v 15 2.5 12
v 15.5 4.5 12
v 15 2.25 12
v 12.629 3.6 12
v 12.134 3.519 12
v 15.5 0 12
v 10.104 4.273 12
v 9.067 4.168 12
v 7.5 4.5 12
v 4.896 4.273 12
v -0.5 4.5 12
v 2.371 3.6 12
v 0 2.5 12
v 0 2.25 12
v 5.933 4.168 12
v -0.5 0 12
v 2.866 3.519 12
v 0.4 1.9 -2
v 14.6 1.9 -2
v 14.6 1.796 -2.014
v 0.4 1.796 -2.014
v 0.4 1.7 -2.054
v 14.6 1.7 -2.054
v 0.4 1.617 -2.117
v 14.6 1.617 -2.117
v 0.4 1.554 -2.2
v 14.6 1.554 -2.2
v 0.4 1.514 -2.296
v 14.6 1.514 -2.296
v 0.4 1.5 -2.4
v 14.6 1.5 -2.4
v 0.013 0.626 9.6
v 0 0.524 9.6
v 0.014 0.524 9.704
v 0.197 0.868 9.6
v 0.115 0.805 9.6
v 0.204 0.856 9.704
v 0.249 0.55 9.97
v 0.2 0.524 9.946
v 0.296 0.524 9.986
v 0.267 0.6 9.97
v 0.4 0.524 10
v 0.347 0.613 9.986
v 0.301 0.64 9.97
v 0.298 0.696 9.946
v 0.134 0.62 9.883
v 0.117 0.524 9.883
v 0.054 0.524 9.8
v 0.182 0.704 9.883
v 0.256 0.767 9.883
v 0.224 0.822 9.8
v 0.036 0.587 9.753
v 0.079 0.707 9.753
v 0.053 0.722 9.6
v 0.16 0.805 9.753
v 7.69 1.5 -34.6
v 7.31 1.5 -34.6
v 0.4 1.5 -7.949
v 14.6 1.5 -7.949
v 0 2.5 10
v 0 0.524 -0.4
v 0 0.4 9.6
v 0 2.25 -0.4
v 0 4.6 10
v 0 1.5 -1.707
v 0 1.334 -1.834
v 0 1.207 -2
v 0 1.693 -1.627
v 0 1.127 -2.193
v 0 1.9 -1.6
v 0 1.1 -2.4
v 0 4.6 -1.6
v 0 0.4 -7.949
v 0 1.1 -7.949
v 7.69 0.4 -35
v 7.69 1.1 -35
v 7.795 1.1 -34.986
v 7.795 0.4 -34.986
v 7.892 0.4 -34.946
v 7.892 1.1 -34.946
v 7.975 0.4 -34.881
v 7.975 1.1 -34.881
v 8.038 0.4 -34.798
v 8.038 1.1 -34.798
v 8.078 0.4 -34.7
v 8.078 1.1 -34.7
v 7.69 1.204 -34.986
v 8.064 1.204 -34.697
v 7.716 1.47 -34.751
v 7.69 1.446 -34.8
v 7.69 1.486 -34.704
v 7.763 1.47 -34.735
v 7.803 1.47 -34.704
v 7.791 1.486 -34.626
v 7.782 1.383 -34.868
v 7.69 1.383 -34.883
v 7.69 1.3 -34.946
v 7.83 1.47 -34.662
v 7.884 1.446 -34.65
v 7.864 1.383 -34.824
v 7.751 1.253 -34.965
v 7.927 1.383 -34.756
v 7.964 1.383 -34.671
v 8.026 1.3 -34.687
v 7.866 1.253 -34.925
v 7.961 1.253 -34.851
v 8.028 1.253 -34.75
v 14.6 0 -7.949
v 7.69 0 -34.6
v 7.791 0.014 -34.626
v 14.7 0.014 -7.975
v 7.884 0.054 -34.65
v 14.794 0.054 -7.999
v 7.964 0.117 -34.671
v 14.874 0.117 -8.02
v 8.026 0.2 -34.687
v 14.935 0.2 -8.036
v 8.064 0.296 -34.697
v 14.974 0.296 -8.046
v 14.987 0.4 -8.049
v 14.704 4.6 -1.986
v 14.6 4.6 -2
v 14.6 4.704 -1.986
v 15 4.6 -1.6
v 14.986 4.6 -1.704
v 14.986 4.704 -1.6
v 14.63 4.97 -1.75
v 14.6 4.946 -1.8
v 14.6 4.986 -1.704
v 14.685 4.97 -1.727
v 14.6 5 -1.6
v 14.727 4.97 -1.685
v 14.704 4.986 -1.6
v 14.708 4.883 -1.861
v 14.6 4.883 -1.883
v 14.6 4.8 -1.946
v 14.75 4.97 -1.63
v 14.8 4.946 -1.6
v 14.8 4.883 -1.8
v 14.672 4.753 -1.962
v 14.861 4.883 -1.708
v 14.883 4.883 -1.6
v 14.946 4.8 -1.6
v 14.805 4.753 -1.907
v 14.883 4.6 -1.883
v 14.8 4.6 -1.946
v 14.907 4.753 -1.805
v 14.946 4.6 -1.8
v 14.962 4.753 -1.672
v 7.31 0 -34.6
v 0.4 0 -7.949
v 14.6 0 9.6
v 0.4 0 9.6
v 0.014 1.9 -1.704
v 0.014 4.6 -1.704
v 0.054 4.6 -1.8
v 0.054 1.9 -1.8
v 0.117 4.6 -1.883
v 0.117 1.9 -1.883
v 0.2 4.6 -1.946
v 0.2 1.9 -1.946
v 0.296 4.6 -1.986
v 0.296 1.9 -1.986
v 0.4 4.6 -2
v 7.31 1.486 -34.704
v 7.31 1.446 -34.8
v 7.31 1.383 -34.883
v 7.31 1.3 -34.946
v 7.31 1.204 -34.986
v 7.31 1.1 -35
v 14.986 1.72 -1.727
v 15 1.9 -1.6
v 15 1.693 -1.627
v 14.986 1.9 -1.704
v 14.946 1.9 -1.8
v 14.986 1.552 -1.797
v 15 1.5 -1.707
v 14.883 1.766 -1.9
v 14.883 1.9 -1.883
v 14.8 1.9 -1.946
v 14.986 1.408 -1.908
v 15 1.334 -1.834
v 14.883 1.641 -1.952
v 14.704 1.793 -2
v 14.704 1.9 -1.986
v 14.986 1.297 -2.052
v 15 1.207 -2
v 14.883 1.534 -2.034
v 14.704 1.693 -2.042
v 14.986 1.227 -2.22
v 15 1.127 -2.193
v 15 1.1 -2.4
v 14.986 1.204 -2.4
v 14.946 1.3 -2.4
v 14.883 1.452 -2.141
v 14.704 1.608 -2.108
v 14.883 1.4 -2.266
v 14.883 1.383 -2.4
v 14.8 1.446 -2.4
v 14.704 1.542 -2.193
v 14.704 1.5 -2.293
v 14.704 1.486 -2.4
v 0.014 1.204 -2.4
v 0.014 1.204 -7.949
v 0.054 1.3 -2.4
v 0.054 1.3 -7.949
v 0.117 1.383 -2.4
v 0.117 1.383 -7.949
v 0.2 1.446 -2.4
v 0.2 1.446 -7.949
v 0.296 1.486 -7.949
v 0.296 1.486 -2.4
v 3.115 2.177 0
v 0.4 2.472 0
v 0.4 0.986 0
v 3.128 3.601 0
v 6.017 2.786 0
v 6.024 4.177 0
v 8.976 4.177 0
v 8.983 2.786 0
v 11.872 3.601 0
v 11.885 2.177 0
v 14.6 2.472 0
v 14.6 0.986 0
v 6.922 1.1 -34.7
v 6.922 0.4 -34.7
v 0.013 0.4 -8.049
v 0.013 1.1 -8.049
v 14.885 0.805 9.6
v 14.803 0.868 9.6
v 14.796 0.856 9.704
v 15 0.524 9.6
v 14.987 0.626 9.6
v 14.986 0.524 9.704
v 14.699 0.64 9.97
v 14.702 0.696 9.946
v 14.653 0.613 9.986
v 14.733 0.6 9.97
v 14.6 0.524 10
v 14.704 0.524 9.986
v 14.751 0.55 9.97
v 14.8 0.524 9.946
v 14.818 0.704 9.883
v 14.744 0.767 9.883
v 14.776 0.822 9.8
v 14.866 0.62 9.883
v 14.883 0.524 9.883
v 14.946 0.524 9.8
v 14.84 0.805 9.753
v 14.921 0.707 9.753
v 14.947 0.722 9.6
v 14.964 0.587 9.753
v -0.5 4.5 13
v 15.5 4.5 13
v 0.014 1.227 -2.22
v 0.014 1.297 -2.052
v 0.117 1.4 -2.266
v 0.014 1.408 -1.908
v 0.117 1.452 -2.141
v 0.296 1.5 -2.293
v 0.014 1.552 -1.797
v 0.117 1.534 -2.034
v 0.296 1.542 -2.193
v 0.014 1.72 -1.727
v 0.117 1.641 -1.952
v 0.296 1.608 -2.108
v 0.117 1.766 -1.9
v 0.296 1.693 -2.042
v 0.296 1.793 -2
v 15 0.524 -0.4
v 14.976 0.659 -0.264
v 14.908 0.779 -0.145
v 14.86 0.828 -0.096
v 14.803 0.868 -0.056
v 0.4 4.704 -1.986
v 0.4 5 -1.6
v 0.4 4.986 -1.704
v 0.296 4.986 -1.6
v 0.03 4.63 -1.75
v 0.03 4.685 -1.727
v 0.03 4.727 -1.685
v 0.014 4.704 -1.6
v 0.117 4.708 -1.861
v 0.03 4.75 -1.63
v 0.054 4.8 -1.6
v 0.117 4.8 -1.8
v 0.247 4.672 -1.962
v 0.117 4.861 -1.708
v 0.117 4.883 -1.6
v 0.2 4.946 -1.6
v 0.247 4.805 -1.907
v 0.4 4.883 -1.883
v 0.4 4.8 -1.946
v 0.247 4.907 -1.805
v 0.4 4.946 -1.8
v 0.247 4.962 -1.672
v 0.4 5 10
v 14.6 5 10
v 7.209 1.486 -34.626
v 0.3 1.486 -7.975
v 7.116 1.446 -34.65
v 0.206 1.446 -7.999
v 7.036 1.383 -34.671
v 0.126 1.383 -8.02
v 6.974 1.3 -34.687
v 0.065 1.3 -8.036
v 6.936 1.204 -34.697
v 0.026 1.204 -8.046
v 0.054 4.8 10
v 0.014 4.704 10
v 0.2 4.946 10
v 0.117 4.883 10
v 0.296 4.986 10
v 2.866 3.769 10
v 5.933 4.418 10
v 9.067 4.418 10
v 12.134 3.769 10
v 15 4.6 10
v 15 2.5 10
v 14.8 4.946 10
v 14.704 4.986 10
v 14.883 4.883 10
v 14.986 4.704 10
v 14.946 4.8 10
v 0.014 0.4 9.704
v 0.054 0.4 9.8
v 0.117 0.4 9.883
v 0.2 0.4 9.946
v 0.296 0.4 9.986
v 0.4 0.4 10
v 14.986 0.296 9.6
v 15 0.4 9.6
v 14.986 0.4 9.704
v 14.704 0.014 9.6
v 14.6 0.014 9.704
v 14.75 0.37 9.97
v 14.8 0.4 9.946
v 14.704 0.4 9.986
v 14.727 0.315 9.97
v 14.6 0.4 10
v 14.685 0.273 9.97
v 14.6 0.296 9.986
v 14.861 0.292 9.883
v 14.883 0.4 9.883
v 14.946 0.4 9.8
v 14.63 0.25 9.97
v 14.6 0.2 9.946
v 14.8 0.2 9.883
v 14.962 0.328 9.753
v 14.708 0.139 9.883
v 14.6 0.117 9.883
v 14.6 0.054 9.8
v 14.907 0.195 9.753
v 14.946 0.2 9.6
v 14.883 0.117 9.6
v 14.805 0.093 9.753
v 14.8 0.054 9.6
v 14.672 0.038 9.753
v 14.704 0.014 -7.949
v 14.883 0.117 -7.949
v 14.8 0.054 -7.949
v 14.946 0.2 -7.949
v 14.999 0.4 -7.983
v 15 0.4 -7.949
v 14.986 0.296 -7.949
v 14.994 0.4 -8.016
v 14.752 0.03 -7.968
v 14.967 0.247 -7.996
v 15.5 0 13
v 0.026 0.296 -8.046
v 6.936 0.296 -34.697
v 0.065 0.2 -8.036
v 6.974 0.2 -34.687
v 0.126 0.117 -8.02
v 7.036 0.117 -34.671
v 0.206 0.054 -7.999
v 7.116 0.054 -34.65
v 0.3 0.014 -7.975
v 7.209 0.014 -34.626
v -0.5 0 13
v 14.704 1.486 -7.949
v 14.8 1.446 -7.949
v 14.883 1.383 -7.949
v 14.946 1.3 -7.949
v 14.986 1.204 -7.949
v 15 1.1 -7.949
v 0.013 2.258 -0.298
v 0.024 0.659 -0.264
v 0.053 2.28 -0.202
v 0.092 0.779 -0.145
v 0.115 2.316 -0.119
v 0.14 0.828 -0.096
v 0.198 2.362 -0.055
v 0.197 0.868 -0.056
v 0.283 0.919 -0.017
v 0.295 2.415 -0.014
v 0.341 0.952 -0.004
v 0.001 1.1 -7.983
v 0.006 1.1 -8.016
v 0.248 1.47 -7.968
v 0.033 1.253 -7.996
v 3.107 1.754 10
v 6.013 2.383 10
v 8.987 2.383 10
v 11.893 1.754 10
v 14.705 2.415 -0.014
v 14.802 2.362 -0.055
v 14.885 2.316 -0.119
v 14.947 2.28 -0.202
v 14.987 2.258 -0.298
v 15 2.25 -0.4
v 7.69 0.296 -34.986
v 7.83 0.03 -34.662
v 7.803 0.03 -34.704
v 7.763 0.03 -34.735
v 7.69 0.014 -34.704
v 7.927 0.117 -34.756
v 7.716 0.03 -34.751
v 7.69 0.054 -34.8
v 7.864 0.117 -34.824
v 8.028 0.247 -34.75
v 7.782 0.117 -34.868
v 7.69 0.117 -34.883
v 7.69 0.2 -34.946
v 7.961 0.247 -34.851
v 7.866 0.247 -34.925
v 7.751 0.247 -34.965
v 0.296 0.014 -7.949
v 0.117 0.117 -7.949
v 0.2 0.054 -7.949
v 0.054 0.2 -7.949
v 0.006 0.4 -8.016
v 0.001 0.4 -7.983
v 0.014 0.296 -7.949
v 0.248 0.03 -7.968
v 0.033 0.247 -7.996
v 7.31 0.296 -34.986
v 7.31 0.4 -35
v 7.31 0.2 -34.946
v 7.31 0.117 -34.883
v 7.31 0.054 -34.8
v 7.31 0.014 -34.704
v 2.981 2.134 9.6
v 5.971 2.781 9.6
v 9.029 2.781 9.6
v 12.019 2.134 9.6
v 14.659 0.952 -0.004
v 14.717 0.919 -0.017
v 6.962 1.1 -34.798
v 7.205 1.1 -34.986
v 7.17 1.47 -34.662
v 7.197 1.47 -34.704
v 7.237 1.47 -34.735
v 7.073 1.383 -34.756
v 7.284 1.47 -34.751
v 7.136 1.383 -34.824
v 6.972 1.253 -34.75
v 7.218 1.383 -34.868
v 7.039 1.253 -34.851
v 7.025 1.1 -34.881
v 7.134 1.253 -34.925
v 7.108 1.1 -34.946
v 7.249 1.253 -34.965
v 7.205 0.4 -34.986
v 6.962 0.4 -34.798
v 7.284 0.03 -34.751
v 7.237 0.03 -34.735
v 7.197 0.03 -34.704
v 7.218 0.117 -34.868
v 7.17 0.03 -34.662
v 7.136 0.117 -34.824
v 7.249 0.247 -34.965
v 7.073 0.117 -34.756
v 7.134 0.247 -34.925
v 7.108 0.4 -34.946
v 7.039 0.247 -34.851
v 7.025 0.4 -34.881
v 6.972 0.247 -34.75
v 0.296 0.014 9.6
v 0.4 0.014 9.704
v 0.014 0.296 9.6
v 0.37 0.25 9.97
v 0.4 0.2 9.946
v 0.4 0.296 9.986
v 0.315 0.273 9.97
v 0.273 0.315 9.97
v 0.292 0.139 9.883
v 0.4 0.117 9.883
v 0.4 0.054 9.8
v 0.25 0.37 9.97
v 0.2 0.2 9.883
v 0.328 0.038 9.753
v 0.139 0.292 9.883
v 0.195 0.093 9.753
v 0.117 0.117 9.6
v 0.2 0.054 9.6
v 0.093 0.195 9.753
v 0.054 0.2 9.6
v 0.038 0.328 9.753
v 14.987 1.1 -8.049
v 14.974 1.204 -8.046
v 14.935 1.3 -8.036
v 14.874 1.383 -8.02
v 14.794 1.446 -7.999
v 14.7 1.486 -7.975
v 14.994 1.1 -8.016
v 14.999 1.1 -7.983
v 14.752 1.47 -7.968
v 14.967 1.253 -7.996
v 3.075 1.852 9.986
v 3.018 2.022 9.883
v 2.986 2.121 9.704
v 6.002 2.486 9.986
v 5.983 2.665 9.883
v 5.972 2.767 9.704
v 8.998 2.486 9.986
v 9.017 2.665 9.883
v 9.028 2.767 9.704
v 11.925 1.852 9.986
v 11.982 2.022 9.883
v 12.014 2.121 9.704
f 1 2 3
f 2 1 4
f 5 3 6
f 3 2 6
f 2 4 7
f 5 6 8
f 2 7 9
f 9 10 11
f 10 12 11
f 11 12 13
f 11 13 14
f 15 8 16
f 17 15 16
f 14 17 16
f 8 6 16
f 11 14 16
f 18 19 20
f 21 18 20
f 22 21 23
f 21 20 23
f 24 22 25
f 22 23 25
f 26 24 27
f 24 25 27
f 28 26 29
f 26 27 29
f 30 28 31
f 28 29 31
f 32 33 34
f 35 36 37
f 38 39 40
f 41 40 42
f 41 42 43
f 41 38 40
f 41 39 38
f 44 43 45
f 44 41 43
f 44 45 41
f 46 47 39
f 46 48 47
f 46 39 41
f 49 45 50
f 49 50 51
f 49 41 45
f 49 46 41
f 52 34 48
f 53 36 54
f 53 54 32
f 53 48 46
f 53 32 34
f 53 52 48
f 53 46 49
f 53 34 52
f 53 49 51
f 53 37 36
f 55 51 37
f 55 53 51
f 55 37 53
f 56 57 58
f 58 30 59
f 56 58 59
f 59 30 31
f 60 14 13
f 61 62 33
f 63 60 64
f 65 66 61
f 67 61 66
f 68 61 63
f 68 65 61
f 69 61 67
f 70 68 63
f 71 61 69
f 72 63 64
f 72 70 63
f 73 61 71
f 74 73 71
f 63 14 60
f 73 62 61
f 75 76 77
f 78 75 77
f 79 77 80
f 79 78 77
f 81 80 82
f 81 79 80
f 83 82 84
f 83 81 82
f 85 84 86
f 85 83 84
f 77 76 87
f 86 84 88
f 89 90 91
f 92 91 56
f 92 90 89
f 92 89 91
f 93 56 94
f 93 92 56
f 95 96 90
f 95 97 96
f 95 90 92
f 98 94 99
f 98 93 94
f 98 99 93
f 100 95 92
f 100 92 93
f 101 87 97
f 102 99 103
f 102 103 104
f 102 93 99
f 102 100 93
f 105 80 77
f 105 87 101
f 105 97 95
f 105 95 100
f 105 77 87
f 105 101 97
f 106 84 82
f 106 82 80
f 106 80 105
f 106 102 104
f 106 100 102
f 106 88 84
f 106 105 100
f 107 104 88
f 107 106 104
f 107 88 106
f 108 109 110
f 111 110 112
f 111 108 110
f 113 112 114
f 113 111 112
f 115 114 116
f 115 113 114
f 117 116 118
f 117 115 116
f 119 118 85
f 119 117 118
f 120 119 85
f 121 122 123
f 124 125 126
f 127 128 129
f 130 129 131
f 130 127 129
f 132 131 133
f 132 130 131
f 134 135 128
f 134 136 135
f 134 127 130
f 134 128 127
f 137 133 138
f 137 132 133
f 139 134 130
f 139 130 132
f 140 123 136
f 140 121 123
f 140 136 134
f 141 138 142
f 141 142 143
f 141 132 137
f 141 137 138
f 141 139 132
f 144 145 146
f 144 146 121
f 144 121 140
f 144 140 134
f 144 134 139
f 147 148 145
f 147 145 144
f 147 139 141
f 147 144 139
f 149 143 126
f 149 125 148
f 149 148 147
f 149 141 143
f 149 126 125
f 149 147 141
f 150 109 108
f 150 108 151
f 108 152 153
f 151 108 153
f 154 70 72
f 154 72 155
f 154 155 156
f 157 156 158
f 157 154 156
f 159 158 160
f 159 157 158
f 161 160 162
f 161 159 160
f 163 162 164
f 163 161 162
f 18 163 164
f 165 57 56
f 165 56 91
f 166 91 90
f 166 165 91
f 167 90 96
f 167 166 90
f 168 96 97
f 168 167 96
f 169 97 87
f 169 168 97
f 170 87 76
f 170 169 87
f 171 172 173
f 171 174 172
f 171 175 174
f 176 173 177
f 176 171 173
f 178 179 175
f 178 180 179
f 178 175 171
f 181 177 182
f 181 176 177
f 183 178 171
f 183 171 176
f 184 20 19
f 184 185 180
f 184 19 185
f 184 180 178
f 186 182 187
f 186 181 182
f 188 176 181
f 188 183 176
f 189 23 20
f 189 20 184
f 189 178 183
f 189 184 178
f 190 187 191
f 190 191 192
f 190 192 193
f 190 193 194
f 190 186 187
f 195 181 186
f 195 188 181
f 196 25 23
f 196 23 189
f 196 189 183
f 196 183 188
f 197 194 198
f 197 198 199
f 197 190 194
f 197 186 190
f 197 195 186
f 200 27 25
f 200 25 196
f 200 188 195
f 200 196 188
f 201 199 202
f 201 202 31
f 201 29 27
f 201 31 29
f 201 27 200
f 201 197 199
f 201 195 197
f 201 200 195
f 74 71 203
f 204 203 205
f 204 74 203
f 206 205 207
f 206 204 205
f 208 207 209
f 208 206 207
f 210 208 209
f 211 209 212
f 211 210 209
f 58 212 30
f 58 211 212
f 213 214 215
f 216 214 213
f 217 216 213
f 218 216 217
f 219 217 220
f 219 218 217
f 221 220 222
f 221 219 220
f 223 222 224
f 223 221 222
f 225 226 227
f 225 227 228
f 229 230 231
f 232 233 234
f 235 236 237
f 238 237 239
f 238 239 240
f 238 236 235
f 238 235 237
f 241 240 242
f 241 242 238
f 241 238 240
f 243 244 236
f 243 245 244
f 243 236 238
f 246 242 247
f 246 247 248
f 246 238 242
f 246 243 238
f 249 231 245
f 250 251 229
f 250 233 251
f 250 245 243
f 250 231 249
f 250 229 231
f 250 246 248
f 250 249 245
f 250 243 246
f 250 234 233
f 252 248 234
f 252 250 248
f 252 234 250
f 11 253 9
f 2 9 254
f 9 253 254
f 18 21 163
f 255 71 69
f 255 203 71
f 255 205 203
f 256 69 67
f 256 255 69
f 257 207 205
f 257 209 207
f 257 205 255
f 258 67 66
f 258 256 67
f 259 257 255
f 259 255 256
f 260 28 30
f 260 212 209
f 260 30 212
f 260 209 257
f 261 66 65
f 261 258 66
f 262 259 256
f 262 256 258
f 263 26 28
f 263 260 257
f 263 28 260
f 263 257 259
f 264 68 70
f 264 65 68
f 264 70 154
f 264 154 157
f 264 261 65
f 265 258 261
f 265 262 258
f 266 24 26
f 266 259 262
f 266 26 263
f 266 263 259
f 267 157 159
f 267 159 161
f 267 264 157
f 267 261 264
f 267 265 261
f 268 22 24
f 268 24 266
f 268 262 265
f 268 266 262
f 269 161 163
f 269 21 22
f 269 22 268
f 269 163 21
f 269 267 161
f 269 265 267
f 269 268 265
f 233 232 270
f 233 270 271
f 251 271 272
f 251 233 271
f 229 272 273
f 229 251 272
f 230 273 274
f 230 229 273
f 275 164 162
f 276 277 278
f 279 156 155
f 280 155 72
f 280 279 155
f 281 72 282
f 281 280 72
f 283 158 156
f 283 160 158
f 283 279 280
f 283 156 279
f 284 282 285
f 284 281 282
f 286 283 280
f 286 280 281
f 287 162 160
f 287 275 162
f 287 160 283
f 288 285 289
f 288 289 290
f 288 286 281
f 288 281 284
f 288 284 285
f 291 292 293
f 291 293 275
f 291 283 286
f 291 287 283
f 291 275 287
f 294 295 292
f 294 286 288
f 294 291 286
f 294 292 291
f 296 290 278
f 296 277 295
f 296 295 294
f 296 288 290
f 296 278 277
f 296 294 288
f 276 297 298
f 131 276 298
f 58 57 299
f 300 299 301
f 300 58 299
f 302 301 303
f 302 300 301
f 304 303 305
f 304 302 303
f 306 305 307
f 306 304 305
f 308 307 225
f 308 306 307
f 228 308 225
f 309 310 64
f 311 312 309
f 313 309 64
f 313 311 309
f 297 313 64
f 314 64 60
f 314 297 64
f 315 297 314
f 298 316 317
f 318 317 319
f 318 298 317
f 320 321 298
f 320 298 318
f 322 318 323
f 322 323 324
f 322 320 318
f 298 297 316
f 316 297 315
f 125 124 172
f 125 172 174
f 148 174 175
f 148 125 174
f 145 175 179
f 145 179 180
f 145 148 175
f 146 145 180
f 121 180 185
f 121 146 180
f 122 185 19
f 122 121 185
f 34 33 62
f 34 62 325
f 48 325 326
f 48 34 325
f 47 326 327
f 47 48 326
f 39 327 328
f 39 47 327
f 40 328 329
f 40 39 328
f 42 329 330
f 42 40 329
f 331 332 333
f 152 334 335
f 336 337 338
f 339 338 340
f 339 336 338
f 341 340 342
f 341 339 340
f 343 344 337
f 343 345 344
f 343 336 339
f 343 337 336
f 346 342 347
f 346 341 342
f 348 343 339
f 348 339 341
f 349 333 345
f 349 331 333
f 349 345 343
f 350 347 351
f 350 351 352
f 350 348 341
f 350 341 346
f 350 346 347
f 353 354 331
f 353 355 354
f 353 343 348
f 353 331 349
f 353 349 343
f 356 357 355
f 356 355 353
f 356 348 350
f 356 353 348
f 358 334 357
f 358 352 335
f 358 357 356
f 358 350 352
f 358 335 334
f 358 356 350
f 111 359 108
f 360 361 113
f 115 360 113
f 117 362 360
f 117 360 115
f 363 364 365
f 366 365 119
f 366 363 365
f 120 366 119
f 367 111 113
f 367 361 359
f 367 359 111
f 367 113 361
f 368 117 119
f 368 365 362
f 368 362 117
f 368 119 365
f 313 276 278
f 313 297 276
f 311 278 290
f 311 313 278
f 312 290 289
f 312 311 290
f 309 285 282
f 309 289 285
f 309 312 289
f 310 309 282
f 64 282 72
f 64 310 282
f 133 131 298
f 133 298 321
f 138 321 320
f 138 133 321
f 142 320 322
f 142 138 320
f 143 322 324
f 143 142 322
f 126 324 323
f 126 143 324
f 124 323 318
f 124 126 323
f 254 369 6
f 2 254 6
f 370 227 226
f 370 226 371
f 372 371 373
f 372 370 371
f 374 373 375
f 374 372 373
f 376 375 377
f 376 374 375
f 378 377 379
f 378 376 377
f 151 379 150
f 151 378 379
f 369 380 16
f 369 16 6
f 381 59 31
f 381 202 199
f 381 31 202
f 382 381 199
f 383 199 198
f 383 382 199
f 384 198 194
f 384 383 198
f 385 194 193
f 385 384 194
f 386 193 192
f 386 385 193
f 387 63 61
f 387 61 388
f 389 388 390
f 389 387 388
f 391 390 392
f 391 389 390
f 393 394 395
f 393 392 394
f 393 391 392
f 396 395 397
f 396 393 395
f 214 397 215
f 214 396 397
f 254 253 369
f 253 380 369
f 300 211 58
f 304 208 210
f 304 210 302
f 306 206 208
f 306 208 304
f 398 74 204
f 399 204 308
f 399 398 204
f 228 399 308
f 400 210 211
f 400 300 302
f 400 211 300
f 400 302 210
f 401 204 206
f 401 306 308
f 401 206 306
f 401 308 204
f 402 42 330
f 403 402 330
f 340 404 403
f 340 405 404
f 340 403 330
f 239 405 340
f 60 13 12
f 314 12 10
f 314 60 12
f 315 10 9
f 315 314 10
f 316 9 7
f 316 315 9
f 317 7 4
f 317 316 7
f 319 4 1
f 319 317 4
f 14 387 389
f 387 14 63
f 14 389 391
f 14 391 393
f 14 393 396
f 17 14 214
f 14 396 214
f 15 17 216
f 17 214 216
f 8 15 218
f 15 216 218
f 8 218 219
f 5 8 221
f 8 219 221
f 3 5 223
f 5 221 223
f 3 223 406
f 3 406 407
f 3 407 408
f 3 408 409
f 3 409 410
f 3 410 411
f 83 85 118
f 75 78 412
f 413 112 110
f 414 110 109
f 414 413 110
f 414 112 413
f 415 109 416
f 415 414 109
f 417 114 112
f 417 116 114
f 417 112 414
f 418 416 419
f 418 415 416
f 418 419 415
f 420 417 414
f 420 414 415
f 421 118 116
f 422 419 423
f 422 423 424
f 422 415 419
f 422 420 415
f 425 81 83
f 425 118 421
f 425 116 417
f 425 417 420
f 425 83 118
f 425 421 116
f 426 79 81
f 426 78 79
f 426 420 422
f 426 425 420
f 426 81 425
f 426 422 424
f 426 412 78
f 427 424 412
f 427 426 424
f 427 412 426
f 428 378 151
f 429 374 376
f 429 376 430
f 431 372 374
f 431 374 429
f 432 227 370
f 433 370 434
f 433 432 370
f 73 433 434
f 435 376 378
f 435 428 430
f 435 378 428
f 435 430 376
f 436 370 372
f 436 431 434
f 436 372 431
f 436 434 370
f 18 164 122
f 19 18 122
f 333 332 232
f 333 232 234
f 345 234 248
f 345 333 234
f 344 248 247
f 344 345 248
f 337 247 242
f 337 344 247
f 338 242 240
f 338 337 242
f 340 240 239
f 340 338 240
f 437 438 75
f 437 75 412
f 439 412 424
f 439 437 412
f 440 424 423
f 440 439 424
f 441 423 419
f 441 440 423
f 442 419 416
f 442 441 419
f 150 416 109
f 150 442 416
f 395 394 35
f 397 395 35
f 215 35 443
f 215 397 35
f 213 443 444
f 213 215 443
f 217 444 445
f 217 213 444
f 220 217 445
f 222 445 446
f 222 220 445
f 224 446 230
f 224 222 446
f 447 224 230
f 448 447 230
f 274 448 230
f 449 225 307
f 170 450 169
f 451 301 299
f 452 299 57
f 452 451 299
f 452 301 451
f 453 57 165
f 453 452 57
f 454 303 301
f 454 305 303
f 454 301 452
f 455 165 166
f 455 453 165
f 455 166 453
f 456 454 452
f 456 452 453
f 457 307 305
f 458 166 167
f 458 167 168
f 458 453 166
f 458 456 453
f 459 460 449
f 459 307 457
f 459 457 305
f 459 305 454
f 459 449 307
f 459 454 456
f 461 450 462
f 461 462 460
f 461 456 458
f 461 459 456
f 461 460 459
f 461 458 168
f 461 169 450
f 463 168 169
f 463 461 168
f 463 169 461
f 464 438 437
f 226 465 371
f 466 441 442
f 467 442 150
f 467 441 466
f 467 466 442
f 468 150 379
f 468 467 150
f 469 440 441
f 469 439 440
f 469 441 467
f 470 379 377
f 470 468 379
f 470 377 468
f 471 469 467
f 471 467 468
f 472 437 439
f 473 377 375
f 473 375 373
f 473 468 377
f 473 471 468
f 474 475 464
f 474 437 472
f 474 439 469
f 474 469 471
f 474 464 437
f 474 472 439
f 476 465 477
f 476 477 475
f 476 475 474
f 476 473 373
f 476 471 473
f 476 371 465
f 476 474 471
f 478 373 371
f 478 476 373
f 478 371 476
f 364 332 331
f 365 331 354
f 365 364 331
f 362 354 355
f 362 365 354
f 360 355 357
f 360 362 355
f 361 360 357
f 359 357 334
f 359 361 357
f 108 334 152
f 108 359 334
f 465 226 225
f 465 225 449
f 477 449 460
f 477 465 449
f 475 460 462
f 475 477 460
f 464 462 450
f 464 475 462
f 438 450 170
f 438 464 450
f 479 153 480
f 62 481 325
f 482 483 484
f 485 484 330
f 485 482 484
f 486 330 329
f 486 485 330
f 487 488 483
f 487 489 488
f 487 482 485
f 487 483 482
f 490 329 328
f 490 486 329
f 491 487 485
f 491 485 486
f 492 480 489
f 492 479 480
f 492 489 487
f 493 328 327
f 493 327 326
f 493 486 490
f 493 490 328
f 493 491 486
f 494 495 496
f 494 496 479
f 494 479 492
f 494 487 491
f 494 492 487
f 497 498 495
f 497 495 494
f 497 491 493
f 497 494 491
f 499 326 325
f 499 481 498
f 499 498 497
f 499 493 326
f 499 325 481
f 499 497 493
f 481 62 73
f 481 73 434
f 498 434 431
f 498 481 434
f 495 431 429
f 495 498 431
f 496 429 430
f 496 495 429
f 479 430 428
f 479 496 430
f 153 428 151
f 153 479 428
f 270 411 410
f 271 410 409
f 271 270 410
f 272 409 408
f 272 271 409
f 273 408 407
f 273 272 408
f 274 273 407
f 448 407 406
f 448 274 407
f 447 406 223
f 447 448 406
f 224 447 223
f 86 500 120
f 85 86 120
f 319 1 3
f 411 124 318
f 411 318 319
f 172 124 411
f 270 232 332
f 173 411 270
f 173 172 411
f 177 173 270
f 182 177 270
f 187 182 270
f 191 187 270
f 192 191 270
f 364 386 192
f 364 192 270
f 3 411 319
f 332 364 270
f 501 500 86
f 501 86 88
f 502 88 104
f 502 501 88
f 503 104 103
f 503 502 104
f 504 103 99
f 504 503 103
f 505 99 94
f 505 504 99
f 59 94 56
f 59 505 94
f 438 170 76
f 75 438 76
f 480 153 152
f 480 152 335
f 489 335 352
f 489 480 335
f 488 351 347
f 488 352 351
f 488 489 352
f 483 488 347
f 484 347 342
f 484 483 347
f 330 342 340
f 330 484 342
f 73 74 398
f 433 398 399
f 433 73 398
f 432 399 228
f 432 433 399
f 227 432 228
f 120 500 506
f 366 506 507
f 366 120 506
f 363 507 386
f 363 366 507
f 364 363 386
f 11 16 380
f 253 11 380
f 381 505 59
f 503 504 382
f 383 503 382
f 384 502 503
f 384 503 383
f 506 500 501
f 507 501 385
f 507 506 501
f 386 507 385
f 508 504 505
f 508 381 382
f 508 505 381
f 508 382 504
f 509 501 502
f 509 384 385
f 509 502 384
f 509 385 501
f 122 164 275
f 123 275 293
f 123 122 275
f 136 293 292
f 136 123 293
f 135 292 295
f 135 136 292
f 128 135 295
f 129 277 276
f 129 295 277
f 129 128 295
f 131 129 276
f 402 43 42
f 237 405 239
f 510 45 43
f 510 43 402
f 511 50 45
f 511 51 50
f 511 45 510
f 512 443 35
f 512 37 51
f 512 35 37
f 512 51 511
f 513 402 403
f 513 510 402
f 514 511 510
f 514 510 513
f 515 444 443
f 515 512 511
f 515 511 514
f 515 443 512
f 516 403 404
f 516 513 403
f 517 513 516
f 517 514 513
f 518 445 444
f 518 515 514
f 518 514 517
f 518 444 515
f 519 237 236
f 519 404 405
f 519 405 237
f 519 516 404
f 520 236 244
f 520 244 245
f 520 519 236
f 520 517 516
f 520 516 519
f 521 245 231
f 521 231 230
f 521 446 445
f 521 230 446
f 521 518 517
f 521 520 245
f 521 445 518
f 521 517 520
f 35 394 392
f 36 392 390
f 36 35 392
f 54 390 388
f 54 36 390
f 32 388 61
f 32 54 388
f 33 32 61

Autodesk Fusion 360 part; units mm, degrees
sketch "Sketch1" plane through (0, 0, 0) normal (0, 0, 1) x (1, 0, 0)
  line L0 (0, 5) -> (15, 5)
  line L1 (15, 5) -> (15, 0)
  line L2 (15, 0) -> (0, 0)
  line L3 (0, 0) -> (0, 5)
  arc A0 (15, 0.75) -> (0, 0.75) centre (7.5, -11.5062) ccw
  arc A1 (15, 2.25) -> (0, 2.25) centre (7.5, -10.8125) ccw
  line L4 (0, 4.25) -> (15, 4.25) construction
  line L5 (0, 1.5) -> (15, 1.5)
  arc A2 (15, 2.5) -> (0, 2.5) centre (7.5, -10.5625) ccw
  dimension "d1" = 1.5
  dimension "d2" = 1.5
  dimension "d3" = 0.75
  dimension "d4" = 15
  dimension "d5" = 5
  dimension "d9" = 0.75
  dimension "d14" = 1.5
  dimension "d25" = 0.25
  dimension "d26" = 0.25
extrude "Extrude1" add sketch "Sketch1" against normal blind 2
extrude "Extrude2" add sketch "Sketch1" along normal blind 10 contours L0 L1 L3 A2 | L1 L3 A1 A2 | L1 L2 L3 A0 L5 | A0 L5
extrude "Extrude3" add sketch "Sketch1" against normal blind 35 contours L3 A0 L5 | L1 A0 L5 | L1 L2 L3 A0 L5
extrude "Extrude4" add sketch "Sketch1" along normal blind 12 and the other way blind -10 contours L1 L3 A1 A2
sketch "Sketch2" plane through (0, 0, 0) normal (0, -1, 0) x (1, 0, 0)
  line L0 (15, -35) -> (15, 10)
  line L1 (15, 10) -> (0, 10)
  line L2 (0, 10) -> (0, -35)
  line L3 (0, -35) -> (15, -35)
  line L4 (-0.5, 13) -> (15.5, 13)
  line L5 (15.5, 13) -> (15.5, 12)
  line L6 (15.5, 12) -> (-0.5, 12)
  line L7 (-0.5, 12) -> (-0.5, 13)
  dimension "d33" = 1
extrude "Extrude5" add sketch "Sketch2" against normal blind 4.5 contours L4 L5 L6 L7
chamfer "Chamfer1" distance 7 distance2 27 1 edges at (15, 0.75, -35) measured on face at (5, 1, -35)
chamfer "Chamfer2" distance 7 distance2 27 1 edges at (0, 0.75, -35) measured on face at (5.3333, 0.5, -35)
fillet "Fillet2" radius 0.4 28 edges at (11.5, 1.5, -21.5) (7.5, 1.5, -35) (3.5, 1.5, -21.5) (3.5, 0, -21.5) (11.5, 0, -21.5) (7.5, 0, -35) (8, 0.75, -35) (7, 0.75, -35) (15, 3.25, -2) (15, 0, 1) (15, 0.75, -8) (15, 1.5, -5) (15, 5, 4) (7.5, 5, -2) (7.5, 1.5, -2) (0, 5, 4) (0, 3.25, -2) (0, 1.5, -5) (0, 0.75, -8) (0, 0, 1) (7.5, 2.8627, 10) (15, 0.375, 10) (0, 0.375, 10) (15, 0.75, 5) (15, 1.5, 0) (0, 0.75, 5) (0, 1.5, 0) (7.5, 0, 10)
equation "d1 = d2"
equation "d26 = d25"
